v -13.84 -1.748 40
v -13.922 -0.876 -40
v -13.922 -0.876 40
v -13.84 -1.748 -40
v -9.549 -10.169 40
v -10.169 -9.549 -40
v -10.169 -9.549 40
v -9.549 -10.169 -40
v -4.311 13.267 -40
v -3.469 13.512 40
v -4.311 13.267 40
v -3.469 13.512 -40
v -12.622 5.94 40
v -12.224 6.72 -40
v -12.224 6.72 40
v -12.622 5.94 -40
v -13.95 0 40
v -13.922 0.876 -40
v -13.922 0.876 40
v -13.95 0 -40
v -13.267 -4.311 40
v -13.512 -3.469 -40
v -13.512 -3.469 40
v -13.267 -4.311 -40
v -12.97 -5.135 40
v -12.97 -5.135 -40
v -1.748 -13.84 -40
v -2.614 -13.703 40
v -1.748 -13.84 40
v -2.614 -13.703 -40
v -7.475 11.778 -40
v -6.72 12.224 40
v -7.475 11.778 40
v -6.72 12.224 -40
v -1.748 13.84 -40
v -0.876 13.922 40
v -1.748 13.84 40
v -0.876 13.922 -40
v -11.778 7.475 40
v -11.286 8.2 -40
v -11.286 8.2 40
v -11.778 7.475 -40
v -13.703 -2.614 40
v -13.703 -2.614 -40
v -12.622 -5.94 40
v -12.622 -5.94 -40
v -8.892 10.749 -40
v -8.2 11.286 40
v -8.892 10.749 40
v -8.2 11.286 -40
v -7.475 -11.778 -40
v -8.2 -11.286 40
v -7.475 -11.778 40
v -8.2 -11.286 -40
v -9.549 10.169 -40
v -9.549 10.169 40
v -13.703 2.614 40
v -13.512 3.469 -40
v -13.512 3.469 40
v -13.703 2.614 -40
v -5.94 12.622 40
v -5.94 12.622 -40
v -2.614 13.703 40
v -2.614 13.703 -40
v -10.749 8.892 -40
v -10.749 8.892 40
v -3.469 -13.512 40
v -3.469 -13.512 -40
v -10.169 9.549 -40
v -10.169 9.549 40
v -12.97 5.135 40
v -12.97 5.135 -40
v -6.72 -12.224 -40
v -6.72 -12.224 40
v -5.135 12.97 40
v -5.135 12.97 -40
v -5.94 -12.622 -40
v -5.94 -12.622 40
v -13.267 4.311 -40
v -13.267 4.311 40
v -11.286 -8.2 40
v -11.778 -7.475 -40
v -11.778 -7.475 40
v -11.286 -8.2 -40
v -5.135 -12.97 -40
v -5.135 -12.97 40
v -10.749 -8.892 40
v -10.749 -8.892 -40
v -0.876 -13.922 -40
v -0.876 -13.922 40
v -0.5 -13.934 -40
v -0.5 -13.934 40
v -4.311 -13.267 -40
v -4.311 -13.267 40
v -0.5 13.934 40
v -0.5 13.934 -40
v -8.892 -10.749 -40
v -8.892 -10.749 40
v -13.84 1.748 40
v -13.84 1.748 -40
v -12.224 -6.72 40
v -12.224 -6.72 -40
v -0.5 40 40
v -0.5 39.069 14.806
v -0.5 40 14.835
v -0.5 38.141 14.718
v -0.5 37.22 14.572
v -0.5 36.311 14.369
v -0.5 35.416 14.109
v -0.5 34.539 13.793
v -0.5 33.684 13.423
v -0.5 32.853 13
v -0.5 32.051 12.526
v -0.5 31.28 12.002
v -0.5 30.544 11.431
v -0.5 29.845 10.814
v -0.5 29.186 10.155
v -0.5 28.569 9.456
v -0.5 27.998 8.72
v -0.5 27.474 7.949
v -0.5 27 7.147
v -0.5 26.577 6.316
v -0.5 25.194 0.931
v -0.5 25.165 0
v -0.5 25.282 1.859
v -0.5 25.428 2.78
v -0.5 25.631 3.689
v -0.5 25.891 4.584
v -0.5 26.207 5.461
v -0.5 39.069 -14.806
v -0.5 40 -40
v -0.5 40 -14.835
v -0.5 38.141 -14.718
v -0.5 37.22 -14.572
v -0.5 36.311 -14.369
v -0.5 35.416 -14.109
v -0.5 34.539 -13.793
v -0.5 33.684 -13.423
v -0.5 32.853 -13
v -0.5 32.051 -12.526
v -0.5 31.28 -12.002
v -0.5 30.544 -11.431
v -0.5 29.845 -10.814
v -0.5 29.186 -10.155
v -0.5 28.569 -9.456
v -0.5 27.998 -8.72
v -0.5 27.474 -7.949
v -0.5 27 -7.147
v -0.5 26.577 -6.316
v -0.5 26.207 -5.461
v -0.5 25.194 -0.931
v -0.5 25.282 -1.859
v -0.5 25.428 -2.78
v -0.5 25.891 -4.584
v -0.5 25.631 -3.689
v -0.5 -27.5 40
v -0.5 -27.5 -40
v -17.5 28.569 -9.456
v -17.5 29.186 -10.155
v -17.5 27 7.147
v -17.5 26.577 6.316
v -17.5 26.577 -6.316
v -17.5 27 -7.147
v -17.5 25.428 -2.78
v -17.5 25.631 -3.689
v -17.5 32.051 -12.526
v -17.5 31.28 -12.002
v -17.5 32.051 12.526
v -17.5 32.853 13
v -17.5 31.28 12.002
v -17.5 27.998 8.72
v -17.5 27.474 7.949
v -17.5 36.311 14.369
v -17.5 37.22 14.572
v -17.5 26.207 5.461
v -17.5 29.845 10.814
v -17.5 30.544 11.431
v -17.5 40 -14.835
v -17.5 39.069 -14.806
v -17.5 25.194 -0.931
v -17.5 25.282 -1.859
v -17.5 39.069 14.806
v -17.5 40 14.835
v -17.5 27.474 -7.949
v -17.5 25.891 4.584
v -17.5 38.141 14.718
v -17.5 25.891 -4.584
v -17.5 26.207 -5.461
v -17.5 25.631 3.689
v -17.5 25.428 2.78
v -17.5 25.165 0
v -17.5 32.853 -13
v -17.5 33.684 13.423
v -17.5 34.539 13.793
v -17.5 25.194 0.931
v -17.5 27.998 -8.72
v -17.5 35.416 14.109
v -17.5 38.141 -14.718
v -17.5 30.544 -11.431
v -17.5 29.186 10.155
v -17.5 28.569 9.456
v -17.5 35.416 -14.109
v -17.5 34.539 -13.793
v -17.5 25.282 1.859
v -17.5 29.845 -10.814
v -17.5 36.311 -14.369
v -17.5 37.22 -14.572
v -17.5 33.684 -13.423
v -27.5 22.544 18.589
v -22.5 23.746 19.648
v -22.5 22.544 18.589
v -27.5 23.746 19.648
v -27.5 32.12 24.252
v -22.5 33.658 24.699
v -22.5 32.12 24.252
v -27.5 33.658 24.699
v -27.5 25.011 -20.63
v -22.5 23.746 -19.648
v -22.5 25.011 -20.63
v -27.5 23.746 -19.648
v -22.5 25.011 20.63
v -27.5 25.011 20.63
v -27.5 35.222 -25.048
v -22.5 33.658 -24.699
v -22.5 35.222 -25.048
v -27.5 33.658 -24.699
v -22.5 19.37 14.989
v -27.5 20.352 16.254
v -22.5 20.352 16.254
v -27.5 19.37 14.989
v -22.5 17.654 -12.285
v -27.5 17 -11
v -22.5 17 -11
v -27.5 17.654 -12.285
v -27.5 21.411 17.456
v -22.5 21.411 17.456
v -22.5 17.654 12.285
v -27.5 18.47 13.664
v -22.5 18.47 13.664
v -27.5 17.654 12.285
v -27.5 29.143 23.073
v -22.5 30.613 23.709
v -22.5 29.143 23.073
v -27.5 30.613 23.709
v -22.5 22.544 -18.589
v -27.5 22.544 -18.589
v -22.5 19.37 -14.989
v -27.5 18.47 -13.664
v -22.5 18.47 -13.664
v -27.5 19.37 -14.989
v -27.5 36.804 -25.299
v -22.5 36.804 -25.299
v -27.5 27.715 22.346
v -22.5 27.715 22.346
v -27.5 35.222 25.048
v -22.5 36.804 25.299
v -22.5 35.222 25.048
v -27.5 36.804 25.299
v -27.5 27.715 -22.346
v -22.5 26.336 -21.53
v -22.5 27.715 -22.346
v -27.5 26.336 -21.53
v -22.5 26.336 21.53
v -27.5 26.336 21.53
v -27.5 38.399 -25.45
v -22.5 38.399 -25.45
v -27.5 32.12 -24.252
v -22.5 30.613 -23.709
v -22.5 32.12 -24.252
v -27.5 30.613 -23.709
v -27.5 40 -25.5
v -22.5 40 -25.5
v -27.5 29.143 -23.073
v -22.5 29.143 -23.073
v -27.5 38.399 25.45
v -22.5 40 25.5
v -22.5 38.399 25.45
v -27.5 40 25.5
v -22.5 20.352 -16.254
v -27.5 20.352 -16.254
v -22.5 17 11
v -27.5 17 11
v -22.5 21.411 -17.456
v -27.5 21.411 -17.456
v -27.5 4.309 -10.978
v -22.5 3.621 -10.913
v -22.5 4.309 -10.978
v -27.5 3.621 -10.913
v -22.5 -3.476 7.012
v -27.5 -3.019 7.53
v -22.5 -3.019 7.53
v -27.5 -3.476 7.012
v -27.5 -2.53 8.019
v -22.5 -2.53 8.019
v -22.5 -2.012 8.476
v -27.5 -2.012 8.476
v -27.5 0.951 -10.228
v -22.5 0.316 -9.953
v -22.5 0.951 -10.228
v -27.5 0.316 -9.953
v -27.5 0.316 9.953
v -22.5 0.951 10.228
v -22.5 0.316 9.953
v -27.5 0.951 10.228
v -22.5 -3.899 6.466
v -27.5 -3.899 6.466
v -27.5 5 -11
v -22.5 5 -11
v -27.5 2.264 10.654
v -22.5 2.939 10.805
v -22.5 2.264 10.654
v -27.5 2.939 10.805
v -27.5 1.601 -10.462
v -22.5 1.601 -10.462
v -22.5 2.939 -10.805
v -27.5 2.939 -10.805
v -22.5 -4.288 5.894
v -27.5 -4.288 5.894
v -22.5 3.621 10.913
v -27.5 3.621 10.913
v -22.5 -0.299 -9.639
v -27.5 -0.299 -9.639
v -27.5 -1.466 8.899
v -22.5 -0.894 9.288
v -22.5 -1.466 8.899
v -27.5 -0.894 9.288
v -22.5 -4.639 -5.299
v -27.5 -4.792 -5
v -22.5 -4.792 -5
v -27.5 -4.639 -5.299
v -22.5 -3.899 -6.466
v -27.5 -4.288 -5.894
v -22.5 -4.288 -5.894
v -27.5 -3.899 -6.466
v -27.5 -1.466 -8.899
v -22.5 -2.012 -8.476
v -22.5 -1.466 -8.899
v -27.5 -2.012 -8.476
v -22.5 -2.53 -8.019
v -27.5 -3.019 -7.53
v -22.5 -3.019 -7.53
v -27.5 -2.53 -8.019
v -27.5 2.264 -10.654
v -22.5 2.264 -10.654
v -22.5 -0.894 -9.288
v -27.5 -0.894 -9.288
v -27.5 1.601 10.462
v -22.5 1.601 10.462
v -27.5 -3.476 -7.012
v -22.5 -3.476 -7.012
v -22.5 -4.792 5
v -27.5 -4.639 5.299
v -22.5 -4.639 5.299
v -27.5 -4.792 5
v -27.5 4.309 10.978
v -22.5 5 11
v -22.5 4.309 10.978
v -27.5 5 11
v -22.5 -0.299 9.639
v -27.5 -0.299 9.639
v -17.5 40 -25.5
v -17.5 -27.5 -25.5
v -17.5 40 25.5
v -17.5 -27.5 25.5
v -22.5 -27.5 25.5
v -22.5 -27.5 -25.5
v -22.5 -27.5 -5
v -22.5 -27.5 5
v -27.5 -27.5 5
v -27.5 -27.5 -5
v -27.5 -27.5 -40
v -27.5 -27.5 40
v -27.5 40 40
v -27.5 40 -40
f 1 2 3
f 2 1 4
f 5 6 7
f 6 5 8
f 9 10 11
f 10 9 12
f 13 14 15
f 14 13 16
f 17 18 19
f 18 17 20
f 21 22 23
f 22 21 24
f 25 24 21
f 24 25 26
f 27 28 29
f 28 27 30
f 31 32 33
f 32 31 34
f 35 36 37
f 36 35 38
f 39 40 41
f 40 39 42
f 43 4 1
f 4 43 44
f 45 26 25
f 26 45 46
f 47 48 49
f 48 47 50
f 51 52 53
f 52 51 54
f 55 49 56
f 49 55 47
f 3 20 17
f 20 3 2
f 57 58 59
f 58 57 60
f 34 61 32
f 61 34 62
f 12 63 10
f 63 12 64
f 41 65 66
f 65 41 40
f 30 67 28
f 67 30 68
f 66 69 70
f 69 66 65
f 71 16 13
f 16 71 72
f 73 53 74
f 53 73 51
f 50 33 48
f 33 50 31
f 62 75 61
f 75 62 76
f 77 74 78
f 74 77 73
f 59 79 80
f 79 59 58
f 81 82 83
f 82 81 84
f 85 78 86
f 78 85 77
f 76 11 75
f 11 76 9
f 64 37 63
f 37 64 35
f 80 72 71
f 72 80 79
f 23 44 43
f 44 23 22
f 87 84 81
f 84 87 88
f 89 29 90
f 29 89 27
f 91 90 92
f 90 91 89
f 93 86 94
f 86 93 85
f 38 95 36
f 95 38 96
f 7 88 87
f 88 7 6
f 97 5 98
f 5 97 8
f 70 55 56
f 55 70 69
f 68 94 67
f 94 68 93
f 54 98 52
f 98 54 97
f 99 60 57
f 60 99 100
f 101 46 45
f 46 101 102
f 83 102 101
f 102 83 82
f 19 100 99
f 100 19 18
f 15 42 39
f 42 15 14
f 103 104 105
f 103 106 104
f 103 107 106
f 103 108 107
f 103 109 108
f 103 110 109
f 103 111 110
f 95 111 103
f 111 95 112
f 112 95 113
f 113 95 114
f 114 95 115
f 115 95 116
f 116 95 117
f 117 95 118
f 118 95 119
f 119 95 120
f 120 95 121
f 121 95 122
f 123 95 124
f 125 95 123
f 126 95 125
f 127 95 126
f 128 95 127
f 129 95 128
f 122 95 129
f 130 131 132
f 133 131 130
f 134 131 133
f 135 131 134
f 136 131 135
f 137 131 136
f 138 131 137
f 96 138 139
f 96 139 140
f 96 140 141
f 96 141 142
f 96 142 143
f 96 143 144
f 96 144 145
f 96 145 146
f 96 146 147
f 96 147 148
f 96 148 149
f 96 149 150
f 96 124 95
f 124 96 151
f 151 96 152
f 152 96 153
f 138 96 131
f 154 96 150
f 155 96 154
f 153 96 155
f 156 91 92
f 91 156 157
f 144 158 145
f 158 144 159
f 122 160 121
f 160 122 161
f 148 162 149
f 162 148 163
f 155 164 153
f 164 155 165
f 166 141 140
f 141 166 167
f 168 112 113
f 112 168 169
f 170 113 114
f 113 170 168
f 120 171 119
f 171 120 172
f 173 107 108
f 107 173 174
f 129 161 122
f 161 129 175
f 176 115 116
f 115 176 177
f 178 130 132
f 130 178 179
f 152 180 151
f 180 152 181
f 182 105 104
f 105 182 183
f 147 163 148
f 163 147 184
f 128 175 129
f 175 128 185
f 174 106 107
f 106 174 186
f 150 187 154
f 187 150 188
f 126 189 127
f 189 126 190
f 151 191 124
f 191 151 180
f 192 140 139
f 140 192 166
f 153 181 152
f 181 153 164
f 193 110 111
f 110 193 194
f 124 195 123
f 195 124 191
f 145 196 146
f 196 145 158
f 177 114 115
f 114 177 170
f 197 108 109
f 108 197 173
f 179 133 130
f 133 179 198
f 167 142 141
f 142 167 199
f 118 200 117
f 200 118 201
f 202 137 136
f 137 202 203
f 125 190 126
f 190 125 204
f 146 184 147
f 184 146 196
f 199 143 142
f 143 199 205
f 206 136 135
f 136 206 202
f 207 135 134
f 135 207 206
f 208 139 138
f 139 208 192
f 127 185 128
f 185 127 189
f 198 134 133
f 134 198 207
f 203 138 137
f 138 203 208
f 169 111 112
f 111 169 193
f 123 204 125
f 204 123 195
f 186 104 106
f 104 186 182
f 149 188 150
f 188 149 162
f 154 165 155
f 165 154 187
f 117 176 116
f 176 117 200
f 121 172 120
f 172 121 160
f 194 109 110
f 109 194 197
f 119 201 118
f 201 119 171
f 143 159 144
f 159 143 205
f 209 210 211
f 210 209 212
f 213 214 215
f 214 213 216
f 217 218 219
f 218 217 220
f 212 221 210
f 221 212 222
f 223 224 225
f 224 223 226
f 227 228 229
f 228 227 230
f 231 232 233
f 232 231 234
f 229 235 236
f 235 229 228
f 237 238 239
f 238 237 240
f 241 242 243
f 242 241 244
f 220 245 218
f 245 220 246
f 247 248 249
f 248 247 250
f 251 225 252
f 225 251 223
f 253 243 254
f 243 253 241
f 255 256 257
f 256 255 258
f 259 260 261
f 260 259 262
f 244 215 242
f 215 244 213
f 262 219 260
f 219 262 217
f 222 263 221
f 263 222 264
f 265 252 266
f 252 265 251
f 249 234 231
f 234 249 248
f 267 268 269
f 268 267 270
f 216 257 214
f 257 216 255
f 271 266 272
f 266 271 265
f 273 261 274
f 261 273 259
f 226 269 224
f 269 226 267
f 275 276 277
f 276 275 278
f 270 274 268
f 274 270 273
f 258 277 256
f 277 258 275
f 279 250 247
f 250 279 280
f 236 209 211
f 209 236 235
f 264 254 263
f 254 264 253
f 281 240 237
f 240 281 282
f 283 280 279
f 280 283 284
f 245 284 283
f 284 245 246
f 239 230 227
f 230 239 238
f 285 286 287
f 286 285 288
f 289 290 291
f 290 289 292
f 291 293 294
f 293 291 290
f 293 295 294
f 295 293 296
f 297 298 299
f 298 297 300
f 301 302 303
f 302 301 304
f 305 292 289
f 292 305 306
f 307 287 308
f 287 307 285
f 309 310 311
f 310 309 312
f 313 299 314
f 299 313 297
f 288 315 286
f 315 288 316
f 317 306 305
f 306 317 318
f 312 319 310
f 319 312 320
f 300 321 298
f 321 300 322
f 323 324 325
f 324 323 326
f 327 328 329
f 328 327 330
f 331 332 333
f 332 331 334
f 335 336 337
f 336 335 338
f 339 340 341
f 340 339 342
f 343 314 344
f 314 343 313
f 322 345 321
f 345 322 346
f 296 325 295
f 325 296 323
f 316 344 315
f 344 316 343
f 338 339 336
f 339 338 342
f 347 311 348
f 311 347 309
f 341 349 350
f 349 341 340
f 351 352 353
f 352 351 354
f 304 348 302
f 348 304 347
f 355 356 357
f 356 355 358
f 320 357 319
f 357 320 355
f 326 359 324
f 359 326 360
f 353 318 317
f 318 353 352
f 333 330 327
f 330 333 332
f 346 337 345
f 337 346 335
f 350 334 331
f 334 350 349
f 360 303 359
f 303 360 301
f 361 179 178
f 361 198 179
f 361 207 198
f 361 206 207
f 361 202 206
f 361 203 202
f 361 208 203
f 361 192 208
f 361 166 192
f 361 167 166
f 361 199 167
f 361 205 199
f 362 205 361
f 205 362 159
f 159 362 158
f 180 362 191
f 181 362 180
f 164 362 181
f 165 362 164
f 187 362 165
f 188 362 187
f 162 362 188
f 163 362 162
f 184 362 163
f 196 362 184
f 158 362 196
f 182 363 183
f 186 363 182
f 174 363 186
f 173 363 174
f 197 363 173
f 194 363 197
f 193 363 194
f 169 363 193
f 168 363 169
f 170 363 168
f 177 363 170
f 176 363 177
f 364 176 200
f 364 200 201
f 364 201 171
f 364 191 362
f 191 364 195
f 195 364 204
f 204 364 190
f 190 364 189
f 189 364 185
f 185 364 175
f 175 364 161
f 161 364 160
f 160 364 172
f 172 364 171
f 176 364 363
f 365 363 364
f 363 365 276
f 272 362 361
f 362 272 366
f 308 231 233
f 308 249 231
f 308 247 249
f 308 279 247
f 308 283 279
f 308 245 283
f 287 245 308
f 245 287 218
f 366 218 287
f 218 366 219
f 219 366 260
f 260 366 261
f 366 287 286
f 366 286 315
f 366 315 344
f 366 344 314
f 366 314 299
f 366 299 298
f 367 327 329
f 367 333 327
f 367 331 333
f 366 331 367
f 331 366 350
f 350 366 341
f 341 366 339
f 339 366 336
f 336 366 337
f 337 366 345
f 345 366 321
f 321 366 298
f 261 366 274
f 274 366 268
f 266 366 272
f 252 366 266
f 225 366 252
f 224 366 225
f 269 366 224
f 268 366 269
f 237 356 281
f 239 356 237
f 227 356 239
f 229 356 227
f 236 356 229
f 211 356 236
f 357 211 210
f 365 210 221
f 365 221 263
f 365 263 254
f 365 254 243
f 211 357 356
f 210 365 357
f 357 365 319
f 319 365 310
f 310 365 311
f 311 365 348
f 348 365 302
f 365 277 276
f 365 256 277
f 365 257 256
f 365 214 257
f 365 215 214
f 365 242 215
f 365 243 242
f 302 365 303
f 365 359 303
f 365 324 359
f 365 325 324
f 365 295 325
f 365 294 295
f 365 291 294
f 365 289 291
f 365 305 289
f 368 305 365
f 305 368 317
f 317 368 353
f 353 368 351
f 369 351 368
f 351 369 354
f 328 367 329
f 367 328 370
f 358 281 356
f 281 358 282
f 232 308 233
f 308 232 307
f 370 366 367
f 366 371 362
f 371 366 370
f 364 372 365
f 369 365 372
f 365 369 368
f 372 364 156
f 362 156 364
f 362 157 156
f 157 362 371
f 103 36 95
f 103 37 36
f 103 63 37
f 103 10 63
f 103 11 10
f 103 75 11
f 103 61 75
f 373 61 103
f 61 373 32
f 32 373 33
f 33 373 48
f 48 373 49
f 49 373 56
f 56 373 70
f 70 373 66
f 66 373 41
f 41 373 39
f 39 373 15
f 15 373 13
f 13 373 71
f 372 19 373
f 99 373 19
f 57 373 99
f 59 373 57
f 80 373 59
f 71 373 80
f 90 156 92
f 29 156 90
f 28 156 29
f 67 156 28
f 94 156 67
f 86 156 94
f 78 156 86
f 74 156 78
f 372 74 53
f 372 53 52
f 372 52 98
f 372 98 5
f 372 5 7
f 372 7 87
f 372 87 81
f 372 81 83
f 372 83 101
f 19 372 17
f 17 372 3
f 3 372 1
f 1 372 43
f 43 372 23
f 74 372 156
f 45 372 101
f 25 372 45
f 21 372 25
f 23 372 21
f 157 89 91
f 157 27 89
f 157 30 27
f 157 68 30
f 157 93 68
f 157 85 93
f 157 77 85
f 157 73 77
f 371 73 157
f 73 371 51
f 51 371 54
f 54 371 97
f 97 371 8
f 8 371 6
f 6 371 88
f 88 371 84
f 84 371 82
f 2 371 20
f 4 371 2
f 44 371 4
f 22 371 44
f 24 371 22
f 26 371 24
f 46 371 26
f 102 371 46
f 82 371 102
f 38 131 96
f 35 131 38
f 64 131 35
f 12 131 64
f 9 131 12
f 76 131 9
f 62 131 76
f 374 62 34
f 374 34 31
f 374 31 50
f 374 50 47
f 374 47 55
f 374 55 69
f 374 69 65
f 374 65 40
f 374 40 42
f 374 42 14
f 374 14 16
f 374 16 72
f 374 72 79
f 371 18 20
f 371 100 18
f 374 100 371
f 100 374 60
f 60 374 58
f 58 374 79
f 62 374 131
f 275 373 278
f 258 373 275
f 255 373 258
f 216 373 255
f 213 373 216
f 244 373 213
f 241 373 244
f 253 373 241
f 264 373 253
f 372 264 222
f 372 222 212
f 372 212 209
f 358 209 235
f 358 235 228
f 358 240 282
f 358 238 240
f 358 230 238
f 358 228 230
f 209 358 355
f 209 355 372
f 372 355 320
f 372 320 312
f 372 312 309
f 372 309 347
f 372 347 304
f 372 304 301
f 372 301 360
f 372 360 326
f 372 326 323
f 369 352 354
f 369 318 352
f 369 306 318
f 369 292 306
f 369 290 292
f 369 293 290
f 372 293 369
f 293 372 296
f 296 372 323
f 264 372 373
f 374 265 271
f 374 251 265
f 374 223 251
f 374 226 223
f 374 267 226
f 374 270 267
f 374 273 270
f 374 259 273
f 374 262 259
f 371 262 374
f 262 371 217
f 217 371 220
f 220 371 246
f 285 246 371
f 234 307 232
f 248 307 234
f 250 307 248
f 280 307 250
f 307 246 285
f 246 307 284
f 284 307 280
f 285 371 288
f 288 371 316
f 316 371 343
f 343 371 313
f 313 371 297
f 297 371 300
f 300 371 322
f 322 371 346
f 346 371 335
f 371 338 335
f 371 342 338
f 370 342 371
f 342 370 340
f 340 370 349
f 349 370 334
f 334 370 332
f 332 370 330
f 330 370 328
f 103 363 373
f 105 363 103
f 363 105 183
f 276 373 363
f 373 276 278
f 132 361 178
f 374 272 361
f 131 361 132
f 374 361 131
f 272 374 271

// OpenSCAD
a = 80;
seatpost = 27.9;
pipe = 1.05*25.4+3;

difference(){
    union()
        {
            cube ([55,a,a],center=true);
        }
    union()
        {
            cylinder(d=seatpost,h=100,$fn=100,center=true);
            cube ([1,100,100],center=true);
            translate([0,a/2,0]) rotate([0,90,0]) cylinder(d=pipe,h=100,$fn=100,center=true);
            translate([-50-20,a/2,0]) rotate([0,90,0]) cylinder(d=51,h=100,$fn=100,center=true);
            translate([-a/2.5+3,5,00]) rotate([0,90,0]) #cylinder(d=22,h=20,$fn=100,center=true);
            translate([a/4,0,0])cube ([a/2,100,100],center=true);
            translate([-a/4,0,0])cube ([5,100,51],center=true);
            translate([-a/2.5,0,0])cube ([20,100,10],center=true);
            translate([-a/2.5,15,0])cube ([20,20,22],center=true);
            translate([0,-35,0])cube ([100,15,100],center=true);
            
        }
    }
